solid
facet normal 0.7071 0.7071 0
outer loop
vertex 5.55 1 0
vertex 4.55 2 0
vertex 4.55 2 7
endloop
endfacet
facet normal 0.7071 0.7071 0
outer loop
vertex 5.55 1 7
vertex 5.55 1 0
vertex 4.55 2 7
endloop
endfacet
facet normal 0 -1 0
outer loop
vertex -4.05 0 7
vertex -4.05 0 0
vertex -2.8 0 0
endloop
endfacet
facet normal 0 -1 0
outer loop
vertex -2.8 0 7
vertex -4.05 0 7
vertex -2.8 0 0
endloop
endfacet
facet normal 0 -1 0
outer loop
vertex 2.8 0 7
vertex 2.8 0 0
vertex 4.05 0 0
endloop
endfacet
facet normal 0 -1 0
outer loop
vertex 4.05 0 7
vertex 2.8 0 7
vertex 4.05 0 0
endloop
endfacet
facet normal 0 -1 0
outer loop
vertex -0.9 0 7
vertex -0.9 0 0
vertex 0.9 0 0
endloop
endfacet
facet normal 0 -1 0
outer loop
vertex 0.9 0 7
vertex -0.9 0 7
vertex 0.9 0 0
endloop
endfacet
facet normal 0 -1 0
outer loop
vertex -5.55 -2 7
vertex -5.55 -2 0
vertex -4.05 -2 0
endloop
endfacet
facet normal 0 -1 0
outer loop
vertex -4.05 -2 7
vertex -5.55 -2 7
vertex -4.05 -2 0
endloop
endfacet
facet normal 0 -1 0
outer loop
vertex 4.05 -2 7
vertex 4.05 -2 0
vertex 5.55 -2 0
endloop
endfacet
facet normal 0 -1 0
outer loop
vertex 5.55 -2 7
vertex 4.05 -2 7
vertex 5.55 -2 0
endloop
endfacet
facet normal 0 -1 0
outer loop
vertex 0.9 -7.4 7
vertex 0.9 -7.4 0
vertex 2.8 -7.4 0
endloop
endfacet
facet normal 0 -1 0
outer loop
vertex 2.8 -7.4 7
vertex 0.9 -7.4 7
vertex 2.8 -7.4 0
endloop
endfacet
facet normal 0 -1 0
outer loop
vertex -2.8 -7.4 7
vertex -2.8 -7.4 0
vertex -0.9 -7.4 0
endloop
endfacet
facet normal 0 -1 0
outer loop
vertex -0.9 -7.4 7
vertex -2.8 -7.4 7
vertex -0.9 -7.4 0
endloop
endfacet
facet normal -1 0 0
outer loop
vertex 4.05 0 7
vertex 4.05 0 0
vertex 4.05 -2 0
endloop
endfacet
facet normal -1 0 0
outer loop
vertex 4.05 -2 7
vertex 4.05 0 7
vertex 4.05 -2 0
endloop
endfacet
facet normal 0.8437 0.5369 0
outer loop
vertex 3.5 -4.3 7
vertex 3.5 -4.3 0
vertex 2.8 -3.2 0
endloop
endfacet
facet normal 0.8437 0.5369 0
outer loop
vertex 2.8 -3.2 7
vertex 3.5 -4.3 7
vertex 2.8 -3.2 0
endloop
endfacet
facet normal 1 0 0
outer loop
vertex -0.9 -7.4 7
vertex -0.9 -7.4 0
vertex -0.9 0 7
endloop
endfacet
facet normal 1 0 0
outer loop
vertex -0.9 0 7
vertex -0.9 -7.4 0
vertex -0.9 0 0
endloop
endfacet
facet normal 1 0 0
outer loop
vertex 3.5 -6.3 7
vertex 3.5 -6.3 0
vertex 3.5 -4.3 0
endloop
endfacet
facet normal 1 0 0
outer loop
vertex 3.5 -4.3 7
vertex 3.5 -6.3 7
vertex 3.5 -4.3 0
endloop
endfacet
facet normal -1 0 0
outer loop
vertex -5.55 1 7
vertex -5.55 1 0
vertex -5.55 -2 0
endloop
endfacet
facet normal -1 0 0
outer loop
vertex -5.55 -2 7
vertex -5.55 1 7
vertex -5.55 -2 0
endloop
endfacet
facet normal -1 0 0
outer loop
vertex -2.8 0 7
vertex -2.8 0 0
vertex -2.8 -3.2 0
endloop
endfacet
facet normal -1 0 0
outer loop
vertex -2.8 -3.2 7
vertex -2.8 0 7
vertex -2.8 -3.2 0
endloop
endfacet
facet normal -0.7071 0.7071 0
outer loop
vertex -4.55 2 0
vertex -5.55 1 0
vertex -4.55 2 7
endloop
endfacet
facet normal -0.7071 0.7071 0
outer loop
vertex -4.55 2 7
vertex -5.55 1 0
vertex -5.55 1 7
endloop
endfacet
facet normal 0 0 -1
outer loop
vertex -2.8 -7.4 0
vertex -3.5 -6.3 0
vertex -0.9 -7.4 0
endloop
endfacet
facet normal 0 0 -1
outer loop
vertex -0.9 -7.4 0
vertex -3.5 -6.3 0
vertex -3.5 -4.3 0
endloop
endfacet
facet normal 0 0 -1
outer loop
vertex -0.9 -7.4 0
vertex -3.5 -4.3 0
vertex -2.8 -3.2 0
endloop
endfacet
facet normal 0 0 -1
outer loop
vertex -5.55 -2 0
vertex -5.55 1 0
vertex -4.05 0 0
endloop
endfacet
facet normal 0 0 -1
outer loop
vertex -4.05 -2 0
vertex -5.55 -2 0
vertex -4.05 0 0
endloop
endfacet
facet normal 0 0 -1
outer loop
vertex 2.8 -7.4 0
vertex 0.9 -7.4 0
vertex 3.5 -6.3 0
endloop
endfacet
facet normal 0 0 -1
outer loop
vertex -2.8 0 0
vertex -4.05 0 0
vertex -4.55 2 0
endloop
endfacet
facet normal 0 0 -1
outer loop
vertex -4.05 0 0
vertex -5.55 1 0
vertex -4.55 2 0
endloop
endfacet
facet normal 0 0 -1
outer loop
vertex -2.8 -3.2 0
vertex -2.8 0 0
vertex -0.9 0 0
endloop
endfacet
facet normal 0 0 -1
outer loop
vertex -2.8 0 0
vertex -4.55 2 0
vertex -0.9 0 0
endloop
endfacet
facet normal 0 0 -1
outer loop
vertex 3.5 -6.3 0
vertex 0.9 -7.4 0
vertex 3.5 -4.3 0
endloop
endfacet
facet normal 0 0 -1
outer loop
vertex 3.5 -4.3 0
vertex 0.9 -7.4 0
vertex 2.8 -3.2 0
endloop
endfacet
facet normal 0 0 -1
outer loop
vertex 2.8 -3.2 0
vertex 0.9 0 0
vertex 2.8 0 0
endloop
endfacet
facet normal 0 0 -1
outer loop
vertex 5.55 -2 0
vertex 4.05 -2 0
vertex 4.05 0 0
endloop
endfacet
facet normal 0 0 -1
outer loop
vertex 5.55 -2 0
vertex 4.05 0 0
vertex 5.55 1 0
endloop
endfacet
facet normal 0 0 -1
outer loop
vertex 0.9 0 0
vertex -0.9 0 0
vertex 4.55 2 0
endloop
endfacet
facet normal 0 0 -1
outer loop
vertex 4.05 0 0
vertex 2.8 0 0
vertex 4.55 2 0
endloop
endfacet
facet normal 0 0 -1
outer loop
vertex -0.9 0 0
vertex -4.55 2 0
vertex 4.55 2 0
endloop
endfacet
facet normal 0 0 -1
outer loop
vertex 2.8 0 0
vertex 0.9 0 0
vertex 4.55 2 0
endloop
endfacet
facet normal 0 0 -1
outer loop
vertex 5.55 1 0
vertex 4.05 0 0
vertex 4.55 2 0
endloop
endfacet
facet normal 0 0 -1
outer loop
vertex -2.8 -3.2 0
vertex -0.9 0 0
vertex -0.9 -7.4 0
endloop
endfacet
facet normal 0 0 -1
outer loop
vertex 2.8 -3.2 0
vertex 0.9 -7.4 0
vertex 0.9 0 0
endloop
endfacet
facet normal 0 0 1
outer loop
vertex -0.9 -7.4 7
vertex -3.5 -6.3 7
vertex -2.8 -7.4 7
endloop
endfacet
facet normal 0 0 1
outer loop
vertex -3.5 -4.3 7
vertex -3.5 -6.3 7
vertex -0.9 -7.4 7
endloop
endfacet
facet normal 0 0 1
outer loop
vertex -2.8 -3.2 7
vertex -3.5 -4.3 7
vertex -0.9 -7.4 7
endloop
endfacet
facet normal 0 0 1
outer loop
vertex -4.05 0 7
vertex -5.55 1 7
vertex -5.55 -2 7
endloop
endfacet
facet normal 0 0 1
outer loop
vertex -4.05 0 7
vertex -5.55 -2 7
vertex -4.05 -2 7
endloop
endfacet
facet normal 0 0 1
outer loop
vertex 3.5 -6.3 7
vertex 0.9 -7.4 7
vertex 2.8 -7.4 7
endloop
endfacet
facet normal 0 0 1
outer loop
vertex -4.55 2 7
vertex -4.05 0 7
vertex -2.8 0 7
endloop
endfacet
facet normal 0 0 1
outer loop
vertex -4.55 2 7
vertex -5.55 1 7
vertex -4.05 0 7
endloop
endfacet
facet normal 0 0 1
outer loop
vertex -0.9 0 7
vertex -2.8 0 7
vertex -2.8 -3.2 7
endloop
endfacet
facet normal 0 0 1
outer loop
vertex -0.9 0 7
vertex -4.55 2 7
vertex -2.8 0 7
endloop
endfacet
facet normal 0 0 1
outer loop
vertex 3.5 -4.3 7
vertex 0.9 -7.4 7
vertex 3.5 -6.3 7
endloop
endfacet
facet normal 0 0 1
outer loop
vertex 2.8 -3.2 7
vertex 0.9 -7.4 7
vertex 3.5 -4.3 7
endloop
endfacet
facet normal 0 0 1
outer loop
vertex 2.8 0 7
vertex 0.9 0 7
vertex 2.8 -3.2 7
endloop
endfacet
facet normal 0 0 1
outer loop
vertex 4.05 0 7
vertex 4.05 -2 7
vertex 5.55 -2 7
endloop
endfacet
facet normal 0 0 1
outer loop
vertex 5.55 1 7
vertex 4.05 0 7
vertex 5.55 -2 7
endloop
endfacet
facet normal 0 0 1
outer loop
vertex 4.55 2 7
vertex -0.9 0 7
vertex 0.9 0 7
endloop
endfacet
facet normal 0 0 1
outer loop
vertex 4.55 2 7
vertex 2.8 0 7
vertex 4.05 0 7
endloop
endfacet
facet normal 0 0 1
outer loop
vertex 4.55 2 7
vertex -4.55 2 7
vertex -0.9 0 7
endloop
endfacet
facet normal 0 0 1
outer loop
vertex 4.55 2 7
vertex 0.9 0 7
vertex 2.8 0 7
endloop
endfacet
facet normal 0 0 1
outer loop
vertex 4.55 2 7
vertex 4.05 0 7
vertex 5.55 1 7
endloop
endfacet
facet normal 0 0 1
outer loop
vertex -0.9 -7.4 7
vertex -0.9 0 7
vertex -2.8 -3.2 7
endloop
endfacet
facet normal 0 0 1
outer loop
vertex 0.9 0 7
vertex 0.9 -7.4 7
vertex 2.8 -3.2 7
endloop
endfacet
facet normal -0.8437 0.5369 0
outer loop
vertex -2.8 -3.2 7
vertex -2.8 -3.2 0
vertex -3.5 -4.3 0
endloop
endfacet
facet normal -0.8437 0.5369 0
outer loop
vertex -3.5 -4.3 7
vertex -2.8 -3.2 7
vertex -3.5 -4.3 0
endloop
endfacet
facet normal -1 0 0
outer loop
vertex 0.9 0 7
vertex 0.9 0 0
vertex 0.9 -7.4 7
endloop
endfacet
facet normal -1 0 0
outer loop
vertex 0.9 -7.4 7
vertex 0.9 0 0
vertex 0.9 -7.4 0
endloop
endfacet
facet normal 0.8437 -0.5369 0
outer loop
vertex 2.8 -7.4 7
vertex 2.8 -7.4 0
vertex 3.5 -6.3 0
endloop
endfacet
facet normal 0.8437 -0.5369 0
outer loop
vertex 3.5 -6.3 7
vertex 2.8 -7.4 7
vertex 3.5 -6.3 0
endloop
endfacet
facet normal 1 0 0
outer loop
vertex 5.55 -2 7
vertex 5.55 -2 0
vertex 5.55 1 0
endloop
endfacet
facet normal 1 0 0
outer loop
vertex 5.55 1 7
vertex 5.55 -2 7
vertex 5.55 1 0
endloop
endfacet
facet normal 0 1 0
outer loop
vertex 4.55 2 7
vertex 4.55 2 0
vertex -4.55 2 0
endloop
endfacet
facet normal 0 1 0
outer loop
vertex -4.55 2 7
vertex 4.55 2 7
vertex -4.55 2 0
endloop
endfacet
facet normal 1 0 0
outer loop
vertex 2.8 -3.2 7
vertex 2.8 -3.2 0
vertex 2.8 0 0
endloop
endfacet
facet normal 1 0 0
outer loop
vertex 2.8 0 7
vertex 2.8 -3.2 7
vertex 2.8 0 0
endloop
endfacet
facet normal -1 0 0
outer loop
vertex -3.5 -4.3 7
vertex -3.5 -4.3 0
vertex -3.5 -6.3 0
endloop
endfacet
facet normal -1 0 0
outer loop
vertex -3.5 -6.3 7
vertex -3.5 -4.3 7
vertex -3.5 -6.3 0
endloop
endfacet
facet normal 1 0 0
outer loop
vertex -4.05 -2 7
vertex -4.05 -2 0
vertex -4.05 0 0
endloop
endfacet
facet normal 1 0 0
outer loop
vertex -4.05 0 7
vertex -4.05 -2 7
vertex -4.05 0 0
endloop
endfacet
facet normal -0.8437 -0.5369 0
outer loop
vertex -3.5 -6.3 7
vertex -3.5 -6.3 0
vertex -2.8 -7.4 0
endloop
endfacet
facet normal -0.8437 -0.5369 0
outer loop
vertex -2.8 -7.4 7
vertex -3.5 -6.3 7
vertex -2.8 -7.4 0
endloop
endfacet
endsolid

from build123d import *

# Parameters (mm, degrees)
F1_DEPTH = 7
F2_SIZE  = 1


with BuildPart() as f1:
    # F0 (on Top) → F1 (new body)
    with BuildSketch(Plane.XY):
        Polygon((-0.9, -7.4), (-0.9, 0), (-2.8, 0), (-2.8, -3.200004), (-2.8, -7.4), align=None)
        Polygon((-2.8, 0), (-0.9, 0), (0.9, 0), (2.8, 0), (4.05, 0), (4.05, -2), (5.55, -2), (5.55, 2), (0, 2), (-5.55, 2), (-5.55, -2), (-4.05, -2), (-4.05, 0), align=None)
        Polygon((2.8, 0), (0.9, 0), (0.9, -7.4), (2.8, -7.4), (2.8, -3.200004), align=None)
        Polygon((-2.8, -7.4), (-2.8, -3.200004), (-3.5, -4.300002), (-3.5, -6.300002), align=None)
        Polygon((2.8, -3.200004), (2.8, -7.4), (3.5, -6.300002), (3.5, -4.300002), align=None)
    extrude(amount=F1_DEPTH)

    # F2
    f2_edges = [f1.edges().sort_by_distance(p)[0] for p in [
        (-5.55, 2, 3.5),
        (5.55, 2, 3.5),
    ]]
    chamfer(f2_edges, length=F2_SIZE)


solid = f1.part
